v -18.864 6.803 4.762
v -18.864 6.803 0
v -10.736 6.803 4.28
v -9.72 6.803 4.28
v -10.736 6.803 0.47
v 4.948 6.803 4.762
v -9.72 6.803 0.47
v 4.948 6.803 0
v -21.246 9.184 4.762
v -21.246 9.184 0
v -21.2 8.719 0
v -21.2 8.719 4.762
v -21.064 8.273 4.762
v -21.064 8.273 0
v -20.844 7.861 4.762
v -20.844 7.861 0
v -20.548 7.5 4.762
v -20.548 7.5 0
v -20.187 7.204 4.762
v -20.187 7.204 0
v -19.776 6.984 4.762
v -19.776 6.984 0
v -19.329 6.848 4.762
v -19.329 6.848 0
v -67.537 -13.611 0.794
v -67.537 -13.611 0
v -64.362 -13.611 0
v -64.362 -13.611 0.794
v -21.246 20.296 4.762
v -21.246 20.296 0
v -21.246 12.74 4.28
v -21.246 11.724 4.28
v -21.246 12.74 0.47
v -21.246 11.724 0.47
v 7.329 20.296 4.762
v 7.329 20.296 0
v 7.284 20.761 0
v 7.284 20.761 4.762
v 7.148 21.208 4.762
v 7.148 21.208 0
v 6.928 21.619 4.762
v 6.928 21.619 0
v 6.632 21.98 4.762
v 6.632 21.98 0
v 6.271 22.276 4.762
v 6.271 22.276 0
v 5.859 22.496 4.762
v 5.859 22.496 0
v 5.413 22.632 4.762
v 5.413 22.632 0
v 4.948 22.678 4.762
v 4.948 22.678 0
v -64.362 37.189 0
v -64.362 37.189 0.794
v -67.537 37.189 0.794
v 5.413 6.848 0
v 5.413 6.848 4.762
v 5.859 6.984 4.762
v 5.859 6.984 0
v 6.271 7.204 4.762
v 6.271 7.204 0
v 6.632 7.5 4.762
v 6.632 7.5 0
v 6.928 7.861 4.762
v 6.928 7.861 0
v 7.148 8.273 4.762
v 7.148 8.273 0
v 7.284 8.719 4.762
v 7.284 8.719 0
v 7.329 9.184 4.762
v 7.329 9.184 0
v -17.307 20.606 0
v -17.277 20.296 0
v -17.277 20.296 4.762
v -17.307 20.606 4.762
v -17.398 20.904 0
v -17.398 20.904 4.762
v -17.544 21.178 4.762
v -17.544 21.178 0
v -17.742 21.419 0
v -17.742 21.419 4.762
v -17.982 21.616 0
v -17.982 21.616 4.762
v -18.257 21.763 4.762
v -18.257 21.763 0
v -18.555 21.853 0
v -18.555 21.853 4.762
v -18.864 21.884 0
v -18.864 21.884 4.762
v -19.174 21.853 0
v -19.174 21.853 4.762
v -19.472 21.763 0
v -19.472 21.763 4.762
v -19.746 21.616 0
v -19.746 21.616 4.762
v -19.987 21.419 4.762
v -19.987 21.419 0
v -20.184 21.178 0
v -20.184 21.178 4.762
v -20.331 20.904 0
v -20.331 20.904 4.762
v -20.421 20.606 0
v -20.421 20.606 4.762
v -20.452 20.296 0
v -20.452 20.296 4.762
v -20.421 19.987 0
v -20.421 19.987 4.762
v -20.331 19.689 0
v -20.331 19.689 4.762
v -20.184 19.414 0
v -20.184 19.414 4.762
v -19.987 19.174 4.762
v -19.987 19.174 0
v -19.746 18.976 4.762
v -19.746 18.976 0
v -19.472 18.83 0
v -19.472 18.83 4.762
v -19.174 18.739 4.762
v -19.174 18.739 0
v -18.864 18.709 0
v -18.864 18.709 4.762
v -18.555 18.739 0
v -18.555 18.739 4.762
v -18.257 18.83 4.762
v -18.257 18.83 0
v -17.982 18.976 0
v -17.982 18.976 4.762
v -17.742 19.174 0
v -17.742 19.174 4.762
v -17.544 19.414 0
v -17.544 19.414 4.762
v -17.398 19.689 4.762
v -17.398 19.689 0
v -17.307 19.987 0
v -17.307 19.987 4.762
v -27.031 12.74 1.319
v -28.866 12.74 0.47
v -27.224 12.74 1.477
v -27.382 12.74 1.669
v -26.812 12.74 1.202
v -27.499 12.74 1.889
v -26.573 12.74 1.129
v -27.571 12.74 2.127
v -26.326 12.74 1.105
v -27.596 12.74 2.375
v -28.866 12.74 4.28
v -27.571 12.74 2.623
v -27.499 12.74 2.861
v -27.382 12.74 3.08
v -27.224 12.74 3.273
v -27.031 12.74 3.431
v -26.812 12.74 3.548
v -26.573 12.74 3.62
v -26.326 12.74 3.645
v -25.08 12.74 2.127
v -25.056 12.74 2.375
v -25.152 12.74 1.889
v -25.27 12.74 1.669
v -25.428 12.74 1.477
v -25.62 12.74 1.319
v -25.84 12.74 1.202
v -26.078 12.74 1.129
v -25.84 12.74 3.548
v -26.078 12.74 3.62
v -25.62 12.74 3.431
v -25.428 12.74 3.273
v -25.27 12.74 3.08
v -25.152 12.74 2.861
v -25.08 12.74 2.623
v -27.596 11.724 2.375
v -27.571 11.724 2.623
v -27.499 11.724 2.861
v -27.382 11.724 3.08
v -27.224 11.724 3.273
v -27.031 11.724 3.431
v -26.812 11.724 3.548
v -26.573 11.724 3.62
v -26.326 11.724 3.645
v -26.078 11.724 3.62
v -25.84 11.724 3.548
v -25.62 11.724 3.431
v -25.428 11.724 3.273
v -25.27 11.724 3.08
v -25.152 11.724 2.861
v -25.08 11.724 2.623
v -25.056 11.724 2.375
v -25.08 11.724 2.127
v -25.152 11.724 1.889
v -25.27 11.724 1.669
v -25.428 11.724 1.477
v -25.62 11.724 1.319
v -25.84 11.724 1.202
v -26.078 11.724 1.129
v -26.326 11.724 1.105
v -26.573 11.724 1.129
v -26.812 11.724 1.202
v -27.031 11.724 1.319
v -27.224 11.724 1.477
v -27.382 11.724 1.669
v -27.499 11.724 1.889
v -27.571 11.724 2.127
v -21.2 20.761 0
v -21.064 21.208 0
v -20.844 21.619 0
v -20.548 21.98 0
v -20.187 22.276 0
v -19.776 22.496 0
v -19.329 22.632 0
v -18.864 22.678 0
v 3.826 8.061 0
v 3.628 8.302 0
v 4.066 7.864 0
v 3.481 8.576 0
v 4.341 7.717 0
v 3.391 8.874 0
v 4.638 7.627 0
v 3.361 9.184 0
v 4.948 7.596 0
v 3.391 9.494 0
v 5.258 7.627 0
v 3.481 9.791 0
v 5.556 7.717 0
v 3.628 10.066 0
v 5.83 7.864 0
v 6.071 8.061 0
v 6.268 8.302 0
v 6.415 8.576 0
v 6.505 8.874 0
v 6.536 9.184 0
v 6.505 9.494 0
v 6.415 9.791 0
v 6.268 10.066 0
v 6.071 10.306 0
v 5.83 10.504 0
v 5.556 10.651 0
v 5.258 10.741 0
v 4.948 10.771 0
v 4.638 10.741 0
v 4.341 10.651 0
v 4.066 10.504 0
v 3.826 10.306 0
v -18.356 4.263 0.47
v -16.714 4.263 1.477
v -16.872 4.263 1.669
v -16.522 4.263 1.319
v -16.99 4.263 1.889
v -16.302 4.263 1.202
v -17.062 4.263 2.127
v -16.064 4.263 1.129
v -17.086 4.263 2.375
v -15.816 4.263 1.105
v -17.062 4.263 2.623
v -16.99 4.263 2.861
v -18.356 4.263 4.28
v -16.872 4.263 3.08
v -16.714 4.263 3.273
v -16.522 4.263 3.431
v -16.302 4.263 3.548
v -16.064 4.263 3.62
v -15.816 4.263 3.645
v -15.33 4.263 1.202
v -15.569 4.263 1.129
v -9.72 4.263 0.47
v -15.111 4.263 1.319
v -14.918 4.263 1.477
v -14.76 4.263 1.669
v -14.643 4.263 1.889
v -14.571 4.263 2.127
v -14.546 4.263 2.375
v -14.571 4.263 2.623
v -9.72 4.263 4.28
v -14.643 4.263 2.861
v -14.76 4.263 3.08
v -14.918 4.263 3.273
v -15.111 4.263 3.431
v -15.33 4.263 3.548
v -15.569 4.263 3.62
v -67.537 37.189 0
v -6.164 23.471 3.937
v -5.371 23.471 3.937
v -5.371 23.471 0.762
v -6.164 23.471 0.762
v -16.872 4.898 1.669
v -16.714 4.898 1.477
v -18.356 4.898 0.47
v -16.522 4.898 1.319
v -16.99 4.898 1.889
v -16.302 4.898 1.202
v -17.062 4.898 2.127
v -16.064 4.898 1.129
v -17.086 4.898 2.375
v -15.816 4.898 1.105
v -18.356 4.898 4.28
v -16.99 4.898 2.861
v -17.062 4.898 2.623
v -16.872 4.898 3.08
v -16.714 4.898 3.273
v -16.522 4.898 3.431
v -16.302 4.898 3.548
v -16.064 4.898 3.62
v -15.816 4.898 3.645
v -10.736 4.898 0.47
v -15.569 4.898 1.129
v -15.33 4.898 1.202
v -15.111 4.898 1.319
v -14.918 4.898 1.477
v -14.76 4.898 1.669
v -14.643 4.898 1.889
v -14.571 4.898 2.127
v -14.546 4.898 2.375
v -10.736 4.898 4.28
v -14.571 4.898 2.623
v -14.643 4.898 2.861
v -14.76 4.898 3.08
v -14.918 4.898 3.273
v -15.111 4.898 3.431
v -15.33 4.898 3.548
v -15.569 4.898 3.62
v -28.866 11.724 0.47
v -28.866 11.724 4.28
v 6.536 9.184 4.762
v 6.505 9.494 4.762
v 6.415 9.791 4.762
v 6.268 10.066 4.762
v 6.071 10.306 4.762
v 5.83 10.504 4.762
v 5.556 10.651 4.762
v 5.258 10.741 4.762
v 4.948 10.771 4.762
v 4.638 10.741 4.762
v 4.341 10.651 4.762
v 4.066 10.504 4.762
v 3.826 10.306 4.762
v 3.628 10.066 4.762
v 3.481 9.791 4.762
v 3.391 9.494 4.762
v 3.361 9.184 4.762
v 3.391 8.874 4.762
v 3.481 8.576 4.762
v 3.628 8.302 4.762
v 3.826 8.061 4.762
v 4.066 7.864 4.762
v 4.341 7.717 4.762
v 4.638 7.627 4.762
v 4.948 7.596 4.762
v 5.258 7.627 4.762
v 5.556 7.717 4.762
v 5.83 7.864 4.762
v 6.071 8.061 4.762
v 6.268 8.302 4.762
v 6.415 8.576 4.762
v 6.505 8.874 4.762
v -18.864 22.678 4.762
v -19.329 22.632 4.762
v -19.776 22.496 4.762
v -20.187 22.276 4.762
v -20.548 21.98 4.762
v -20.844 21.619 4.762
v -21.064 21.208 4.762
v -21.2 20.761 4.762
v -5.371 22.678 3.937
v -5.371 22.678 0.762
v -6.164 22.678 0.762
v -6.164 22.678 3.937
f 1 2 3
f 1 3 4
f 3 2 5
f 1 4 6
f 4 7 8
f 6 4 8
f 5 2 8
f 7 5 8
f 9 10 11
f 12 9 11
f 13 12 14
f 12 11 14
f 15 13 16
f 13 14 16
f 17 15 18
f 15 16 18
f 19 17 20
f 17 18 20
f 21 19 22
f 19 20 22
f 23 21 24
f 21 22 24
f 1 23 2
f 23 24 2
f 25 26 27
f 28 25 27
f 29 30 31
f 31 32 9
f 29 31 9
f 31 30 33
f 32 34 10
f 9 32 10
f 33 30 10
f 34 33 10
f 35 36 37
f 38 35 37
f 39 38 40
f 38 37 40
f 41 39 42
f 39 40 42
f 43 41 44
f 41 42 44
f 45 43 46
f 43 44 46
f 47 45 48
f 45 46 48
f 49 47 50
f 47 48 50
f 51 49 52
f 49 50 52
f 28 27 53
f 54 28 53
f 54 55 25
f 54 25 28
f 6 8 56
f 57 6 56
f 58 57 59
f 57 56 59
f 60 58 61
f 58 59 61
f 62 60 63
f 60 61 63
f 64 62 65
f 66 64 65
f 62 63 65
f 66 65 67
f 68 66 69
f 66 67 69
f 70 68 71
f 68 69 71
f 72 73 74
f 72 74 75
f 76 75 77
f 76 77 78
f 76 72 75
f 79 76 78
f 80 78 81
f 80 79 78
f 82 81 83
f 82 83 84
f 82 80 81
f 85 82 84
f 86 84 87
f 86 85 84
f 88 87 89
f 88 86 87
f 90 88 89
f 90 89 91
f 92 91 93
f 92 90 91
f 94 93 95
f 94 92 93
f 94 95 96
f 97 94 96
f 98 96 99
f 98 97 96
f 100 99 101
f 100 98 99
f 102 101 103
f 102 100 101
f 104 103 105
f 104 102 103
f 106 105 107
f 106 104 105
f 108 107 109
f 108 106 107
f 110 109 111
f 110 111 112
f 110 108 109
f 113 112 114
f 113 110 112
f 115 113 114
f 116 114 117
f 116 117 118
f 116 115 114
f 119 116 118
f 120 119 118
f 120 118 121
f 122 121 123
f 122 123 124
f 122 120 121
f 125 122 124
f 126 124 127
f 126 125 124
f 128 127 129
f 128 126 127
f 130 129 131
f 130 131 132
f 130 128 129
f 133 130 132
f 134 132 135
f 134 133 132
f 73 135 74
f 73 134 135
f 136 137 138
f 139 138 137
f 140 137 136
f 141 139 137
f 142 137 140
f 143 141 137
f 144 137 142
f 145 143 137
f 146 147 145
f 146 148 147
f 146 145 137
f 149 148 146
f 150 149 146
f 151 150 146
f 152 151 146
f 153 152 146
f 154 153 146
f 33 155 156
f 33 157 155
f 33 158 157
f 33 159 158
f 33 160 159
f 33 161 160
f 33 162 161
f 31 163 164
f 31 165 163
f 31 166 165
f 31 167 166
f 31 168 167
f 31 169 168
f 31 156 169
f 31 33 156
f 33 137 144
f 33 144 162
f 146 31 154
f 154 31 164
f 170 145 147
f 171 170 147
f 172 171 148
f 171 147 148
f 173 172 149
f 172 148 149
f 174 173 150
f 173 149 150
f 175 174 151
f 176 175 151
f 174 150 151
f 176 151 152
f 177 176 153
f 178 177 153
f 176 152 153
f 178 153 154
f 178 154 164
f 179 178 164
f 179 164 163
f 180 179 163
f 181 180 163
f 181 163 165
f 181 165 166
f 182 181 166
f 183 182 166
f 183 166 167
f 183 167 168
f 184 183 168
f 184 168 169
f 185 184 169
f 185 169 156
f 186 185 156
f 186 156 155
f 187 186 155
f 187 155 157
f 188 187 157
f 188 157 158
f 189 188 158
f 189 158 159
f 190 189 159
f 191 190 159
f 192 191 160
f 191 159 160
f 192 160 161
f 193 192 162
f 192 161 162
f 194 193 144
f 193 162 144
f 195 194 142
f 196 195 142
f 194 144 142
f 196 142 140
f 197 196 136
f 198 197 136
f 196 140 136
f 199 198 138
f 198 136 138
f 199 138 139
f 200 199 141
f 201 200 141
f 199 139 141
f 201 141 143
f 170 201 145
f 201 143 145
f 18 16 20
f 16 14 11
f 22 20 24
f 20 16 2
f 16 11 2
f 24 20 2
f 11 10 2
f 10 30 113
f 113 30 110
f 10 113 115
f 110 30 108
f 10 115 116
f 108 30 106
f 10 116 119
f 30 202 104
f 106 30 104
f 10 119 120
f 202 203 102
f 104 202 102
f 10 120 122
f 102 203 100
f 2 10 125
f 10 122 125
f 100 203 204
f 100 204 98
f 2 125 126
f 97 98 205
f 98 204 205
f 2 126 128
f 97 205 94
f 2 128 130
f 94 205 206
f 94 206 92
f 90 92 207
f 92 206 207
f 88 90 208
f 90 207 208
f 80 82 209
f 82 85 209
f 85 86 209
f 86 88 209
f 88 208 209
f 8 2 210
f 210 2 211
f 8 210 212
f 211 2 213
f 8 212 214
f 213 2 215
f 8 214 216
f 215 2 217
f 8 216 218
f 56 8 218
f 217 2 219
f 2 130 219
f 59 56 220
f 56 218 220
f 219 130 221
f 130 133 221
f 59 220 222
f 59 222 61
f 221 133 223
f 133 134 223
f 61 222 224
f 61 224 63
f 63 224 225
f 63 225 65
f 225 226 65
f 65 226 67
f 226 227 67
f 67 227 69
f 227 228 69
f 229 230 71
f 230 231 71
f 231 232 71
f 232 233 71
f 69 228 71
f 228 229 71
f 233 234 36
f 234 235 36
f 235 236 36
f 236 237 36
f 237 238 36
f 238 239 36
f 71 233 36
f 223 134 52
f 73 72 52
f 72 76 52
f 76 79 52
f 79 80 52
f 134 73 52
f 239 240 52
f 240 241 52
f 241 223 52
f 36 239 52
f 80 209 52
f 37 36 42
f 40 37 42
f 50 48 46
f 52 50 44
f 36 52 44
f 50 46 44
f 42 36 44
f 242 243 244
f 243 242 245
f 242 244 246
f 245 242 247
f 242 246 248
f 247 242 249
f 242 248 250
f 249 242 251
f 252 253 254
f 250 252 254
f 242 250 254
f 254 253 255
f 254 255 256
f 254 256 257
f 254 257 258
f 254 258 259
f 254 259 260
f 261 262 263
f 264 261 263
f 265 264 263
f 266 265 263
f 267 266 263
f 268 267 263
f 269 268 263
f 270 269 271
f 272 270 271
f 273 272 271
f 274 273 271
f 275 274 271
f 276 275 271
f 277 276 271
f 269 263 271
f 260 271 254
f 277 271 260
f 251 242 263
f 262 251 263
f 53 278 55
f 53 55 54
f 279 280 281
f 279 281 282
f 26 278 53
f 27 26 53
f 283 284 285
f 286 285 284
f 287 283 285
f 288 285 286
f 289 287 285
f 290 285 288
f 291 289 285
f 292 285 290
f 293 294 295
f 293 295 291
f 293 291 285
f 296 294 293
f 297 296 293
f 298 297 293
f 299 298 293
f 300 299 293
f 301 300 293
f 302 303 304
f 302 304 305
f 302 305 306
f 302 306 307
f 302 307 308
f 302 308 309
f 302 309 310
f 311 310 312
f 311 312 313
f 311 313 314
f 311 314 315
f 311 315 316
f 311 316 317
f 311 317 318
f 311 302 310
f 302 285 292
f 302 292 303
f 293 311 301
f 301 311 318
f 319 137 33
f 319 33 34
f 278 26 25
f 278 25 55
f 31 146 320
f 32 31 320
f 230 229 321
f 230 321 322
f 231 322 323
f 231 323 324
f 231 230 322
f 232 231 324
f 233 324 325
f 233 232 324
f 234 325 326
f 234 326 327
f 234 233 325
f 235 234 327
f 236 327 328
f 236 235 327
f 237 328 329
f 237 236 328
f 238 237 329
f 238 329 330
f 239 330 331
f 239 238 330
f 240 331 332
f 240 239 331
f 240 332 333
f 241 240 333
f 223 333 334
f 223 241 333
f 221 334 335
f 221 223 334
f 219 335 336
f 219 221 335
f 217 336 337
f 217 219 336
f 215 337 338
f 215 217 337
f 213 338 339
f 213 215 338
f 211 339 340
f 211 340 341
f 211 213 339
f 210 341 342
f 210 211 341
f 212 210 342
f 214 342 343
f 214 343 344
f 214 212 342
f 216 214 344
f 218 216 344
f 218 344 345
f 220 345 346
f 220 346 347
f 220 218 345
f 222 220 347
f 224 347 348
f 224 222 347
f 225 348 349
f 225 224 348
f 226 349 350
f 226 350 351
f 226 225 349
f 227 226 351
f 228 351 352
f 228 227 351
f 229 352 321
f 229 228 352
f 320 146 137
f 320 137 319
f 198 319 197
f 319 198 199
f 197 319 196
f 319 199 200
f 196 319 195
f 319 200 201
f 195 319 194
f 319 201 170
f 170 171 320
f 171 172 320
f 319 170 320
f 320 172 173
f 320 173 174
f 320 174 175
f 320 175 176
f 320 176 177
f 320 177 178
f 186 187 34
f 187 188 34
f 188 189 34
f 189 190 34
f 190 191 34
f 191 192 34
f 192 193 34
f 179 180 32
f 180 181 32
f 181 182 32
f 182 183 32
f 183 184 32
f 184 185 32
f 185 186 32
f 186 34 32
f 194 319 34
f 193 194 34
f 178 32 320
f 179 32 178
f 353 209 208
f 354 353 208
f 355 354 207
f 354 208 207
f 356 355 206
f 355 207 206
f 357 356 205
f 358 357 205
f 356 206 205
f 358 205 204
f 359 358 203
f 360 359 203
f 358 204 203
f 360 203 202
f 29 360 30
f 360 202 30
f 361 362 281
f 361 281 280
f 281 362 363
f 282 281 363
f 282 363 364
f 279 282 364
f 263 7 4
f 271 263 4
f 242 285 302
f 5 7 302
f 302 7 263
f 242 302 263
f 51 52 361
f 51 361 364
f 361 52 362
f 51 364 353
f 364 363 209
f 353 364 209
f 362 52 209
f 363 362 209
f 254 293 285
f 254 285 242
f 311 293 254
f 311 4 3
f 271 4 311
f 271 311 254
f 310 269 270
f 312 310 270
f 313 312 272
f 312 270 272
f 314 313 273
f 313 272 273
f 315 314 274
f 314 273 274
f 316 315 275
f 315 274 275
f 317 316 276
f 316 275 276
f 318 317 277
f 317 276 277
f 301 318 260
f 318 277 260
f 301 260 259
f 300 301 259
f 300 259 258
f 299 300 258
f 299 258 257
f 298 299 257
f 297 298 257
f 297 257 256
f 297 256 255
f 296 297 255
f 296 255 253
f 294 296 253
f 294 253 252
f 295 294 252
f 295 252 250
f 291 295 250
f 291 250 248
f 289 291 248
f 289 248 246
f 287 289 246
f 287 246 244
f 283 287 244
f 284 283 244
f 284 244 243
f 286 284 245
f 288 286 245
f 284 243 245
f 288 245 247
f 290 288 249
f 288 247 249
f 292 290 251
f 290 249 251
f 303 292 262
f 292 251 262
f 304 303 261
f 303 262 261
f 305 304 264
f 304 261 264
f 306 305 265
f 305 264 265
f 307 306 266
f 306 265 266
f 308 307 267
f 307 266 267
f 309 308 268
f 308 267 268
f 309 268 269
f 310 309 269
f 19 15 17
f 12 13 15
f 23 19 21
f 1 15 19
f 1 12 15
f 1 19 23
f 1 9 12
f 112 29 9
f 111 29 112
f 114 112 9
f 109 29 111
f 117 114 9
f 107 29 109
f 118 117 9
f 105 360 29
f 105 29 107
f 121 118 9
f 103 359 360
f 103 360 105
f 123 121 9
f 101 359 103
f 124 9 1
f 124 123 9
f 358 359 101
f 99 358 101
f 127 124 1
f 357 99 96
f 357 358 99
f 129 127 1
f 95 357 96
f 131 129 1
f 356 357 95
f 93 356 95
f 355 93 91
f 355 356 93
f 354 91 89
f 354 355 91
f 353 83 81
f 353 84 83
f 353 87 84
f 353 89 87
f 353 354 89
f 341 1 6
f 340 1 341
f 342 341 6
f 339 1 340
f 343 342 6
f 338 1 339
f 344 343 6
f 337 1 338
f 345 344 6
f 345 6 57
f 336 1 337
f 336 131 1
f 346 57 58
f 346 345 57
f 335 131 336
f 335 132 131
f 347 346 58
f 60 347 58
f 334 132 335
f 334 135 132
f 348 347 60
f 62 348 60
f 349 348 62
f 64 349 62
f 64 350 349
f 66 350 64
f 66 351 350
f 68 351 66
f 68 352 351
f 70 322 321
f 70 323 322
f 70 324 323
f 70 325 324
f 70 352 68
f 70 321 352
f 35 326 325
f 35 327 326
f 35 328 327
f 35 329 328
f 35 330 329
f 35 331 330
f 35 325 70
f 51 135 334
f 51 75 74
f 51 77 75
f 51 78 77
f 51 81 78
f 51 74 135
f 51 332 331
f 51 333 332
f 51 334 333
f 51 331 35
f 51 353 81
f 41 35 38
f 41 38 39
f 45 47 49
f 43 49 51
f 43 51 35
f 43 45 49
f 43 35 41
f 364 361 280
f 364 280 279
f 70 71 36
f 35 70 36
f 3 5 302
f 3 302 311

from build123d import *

# Parameters (mm, degrees)
F0_R      = 1.5875
F1_DEPTH  = 4.7625
F2_W      = 3.175
F2_H      = 50.8
F3_DEPTH  = 0.79375
F4_W      = 0.79375
F4_H      = 3.175
F5_DEPTH  = 0.79375
F6_W      = 1.016
F6_H      = 3.81
F7_DEPTH  = 2.54
F8_W      = 0.635
F8_H      = 3.81
F9_DEPTH  = 7.62
F10_R     = 1.27
F11_DEPTH = 1.16693
F12_W     = 1.016
F12_H     = 3.81
F13_DEPTH = 7.62
F14_R     = 1.27
F15_DEPTH = 25.4


# Not quite as in the source:
# - a length typed as a fraction of an inch, garbled in the dataset ("3 / 203.2 mm" for 3/8 in), is restored


with BuildPart() as f1:
    # F0 (on Top) → F1 (new body)
    with BuildSketch(Plane.XY):
        with BuildLine():
            ThreePointArc((7.3293575469, 20.2963850541), (6.6319055696, 21.9801830768), (4.9481075469, 22.6776350541))
            ThreePointArc((4.9481075469, 22.6776350541), (3.2643095242, 18.6125870314), (7.3293575469, 20.2963850541))
        make_face()
        with BuildLine():
            ThreePointArc((-16.4831424531, 9.1838850541), (-18.8643924531, 11.5651350541), (-21.2456424531, 9.1838850541))
            ThreePointArc((-21.2456424531, 9.1838850541), (-20.5481904758, 7.5000870314), (-18.8643924531, 6.8026350541))
            ThreePointArc((-18.8643924531, 6.8026350541), (-17.1805944304, 7.5000870314), (-16.4831424531, 9.1838850541))
        make_face()
        with BuildLine():
            ThreePointArc((-16.4831424531, 20.2963850541), (-17.1805944304, 21.9801830768), (-18.8643924531, 22.6776350541))
            ThreePointArc((-18.8643924531, 22.6776350541), (-20.5481904758, 21.9801830768), (-21.2456424531, 20.2963850541))
            ThreePointArc((-21.2456424531, 20.2963850541), (-18.8643924531, 17.9151350541), (-16.4831424531, 20.2963850541))
        make_face()
        with Locations((-18.8643924531, 20.2963850541)):
            Circle(F0_R, mode=Mode.SUBTRACT)
        with BuildLine():
            ThreePointArc((4.9481075338, 6.8026350541), (6.631905565, 7.5000870268), (7.3293575469, 9.1838850541))
            ThreePointArc((7.3293575469, 9.1838850541), (3.2643095288, 10.8676830814), (4.9481075338, 6.8026350541))
        make_face()
        with Locations((4.9481075469, 9.1838850541)):
            Circle(F0_R, mode=Mode.SUBTRACT)
        with BuildLine():
            Line((4.9481075469, 22.6776350541), (-18.8643924531, 22.6776350541))
            ThreePointArc((-18.8643924531, 22.6776350541), (-17.1805944304, 21.9801830768), (-16.4831424531, 20.2963850541))
            ThreePointArc((-16.4831424531, 20.2963850541), (-18.8643924531, 17.9151350541), (-21.2456424531, 20.2963850541))
            Line((-21.2456424531, 20.2963850541), (-21.2456424531, 9.1838850541))
            ThreePointArc((-21.2456424531, 9.1838850541), (-18.8643924531, 11.5651350541), (-16.4831424531, 9.1838850541))
            ThreePointArc((-16.4831424531, 9.1838850541), (-17.1805944304, 7.5000870314), (-18.8643924531, 6.8026350541))
            Line((-18.8643924531, 6.8026350541), (4.9481075338, 6.8026350541))
            ThreePointArc((4.9481075338, 6.8026350541), (3.2643095288, 10.8676830814), (7.3293575469, 9.1838850541))
            Line((7.3293575469, 9.1838850541), (7.3293575469, 20.2963850541))
            ThreePointArc((7.3293575469, 20.2963850541), (3.2643095242, 18.6125870314), (4.9481075469, 22.6776350541))
        make_face()
    extrude(amount=F1_DEPTH)

    # F4 (on face) → F5 (join)
    with BuildSketch(Plane(origin=(0, 22.6776350541, 0), x_dir=(-1, 0, 0), z_dir=(0, 1, 0))):
        with Locations((5.7675174531, 2.3495)):
            Rectangle(F4_W, F4_H)
    extrude(amount=F5_DEPTH)

    # F6 (on face) → F7 (join)
    with BuildSketch(Plane.XZ.offset(-6.8026350541)):
        with Locations((-10.2283924531, 2.3749)):
            Rectangle(F6_W, F6_H)
    extrude(amount=F7_DEPTH)

    # F8 (on face) → F9 (join)
    with BuildSketch(Plane(origin=(-10.7363924531, 0, 0), x_dir=(0, -1, 0), z_dir=(-1, 0, 0))):
        with Locations((-4.5801350541, 2.3749)):
            Rectangle(F8_W, F8_H)
    extrude(amount=F9_DEPTH)

    # F10 (on face) → F11 (cut)
    with BuildSketch(Plane.XZ.offset(-4.2626350541)):
        with Locations((-15.8163924531, 2.3749)):
            Circle(F10_R)
    extrude(amount=-F11_DEPTH, mode=Mode.SUBTRACT)

    # F12 (on face) → F13 (join)
    with BuildSketch(Plane(origin=(-21.2456424531, 0, 0), x_dir=(0, -1, 0), z_dir=(-1, 0, 0))):
        with Locations((-12.2318850541, 2.3749)):
            Rectangle(F12_W, F12_H)
    extrude(amount=F13_DEPTH)

    # F14 (on face) → F15 (cut)
    with BuildSketch(Plane(origin=(0, 12.7398850541, 0), x_dir=(-1, 0, 0), z_dir=(0, 1, 0))):
        with Locations((26.3256424531, 2.3749)):
            Circle(F14_R)
    extrude(amount=-F15_DEPTH, mode=Mode.SUBTRACT)


with BuildPart() as f3:
    # F2 (on Top) → F3 (new body)
    with BuildSketch(Plane.XY):
        with Locations((-65.9492532059, 11.7886504158)):
            Rectangle(F2_W, F2_H)
    extrude(amount=F3_DEPTH)


solid = Compound([f1.part, f3.part])
